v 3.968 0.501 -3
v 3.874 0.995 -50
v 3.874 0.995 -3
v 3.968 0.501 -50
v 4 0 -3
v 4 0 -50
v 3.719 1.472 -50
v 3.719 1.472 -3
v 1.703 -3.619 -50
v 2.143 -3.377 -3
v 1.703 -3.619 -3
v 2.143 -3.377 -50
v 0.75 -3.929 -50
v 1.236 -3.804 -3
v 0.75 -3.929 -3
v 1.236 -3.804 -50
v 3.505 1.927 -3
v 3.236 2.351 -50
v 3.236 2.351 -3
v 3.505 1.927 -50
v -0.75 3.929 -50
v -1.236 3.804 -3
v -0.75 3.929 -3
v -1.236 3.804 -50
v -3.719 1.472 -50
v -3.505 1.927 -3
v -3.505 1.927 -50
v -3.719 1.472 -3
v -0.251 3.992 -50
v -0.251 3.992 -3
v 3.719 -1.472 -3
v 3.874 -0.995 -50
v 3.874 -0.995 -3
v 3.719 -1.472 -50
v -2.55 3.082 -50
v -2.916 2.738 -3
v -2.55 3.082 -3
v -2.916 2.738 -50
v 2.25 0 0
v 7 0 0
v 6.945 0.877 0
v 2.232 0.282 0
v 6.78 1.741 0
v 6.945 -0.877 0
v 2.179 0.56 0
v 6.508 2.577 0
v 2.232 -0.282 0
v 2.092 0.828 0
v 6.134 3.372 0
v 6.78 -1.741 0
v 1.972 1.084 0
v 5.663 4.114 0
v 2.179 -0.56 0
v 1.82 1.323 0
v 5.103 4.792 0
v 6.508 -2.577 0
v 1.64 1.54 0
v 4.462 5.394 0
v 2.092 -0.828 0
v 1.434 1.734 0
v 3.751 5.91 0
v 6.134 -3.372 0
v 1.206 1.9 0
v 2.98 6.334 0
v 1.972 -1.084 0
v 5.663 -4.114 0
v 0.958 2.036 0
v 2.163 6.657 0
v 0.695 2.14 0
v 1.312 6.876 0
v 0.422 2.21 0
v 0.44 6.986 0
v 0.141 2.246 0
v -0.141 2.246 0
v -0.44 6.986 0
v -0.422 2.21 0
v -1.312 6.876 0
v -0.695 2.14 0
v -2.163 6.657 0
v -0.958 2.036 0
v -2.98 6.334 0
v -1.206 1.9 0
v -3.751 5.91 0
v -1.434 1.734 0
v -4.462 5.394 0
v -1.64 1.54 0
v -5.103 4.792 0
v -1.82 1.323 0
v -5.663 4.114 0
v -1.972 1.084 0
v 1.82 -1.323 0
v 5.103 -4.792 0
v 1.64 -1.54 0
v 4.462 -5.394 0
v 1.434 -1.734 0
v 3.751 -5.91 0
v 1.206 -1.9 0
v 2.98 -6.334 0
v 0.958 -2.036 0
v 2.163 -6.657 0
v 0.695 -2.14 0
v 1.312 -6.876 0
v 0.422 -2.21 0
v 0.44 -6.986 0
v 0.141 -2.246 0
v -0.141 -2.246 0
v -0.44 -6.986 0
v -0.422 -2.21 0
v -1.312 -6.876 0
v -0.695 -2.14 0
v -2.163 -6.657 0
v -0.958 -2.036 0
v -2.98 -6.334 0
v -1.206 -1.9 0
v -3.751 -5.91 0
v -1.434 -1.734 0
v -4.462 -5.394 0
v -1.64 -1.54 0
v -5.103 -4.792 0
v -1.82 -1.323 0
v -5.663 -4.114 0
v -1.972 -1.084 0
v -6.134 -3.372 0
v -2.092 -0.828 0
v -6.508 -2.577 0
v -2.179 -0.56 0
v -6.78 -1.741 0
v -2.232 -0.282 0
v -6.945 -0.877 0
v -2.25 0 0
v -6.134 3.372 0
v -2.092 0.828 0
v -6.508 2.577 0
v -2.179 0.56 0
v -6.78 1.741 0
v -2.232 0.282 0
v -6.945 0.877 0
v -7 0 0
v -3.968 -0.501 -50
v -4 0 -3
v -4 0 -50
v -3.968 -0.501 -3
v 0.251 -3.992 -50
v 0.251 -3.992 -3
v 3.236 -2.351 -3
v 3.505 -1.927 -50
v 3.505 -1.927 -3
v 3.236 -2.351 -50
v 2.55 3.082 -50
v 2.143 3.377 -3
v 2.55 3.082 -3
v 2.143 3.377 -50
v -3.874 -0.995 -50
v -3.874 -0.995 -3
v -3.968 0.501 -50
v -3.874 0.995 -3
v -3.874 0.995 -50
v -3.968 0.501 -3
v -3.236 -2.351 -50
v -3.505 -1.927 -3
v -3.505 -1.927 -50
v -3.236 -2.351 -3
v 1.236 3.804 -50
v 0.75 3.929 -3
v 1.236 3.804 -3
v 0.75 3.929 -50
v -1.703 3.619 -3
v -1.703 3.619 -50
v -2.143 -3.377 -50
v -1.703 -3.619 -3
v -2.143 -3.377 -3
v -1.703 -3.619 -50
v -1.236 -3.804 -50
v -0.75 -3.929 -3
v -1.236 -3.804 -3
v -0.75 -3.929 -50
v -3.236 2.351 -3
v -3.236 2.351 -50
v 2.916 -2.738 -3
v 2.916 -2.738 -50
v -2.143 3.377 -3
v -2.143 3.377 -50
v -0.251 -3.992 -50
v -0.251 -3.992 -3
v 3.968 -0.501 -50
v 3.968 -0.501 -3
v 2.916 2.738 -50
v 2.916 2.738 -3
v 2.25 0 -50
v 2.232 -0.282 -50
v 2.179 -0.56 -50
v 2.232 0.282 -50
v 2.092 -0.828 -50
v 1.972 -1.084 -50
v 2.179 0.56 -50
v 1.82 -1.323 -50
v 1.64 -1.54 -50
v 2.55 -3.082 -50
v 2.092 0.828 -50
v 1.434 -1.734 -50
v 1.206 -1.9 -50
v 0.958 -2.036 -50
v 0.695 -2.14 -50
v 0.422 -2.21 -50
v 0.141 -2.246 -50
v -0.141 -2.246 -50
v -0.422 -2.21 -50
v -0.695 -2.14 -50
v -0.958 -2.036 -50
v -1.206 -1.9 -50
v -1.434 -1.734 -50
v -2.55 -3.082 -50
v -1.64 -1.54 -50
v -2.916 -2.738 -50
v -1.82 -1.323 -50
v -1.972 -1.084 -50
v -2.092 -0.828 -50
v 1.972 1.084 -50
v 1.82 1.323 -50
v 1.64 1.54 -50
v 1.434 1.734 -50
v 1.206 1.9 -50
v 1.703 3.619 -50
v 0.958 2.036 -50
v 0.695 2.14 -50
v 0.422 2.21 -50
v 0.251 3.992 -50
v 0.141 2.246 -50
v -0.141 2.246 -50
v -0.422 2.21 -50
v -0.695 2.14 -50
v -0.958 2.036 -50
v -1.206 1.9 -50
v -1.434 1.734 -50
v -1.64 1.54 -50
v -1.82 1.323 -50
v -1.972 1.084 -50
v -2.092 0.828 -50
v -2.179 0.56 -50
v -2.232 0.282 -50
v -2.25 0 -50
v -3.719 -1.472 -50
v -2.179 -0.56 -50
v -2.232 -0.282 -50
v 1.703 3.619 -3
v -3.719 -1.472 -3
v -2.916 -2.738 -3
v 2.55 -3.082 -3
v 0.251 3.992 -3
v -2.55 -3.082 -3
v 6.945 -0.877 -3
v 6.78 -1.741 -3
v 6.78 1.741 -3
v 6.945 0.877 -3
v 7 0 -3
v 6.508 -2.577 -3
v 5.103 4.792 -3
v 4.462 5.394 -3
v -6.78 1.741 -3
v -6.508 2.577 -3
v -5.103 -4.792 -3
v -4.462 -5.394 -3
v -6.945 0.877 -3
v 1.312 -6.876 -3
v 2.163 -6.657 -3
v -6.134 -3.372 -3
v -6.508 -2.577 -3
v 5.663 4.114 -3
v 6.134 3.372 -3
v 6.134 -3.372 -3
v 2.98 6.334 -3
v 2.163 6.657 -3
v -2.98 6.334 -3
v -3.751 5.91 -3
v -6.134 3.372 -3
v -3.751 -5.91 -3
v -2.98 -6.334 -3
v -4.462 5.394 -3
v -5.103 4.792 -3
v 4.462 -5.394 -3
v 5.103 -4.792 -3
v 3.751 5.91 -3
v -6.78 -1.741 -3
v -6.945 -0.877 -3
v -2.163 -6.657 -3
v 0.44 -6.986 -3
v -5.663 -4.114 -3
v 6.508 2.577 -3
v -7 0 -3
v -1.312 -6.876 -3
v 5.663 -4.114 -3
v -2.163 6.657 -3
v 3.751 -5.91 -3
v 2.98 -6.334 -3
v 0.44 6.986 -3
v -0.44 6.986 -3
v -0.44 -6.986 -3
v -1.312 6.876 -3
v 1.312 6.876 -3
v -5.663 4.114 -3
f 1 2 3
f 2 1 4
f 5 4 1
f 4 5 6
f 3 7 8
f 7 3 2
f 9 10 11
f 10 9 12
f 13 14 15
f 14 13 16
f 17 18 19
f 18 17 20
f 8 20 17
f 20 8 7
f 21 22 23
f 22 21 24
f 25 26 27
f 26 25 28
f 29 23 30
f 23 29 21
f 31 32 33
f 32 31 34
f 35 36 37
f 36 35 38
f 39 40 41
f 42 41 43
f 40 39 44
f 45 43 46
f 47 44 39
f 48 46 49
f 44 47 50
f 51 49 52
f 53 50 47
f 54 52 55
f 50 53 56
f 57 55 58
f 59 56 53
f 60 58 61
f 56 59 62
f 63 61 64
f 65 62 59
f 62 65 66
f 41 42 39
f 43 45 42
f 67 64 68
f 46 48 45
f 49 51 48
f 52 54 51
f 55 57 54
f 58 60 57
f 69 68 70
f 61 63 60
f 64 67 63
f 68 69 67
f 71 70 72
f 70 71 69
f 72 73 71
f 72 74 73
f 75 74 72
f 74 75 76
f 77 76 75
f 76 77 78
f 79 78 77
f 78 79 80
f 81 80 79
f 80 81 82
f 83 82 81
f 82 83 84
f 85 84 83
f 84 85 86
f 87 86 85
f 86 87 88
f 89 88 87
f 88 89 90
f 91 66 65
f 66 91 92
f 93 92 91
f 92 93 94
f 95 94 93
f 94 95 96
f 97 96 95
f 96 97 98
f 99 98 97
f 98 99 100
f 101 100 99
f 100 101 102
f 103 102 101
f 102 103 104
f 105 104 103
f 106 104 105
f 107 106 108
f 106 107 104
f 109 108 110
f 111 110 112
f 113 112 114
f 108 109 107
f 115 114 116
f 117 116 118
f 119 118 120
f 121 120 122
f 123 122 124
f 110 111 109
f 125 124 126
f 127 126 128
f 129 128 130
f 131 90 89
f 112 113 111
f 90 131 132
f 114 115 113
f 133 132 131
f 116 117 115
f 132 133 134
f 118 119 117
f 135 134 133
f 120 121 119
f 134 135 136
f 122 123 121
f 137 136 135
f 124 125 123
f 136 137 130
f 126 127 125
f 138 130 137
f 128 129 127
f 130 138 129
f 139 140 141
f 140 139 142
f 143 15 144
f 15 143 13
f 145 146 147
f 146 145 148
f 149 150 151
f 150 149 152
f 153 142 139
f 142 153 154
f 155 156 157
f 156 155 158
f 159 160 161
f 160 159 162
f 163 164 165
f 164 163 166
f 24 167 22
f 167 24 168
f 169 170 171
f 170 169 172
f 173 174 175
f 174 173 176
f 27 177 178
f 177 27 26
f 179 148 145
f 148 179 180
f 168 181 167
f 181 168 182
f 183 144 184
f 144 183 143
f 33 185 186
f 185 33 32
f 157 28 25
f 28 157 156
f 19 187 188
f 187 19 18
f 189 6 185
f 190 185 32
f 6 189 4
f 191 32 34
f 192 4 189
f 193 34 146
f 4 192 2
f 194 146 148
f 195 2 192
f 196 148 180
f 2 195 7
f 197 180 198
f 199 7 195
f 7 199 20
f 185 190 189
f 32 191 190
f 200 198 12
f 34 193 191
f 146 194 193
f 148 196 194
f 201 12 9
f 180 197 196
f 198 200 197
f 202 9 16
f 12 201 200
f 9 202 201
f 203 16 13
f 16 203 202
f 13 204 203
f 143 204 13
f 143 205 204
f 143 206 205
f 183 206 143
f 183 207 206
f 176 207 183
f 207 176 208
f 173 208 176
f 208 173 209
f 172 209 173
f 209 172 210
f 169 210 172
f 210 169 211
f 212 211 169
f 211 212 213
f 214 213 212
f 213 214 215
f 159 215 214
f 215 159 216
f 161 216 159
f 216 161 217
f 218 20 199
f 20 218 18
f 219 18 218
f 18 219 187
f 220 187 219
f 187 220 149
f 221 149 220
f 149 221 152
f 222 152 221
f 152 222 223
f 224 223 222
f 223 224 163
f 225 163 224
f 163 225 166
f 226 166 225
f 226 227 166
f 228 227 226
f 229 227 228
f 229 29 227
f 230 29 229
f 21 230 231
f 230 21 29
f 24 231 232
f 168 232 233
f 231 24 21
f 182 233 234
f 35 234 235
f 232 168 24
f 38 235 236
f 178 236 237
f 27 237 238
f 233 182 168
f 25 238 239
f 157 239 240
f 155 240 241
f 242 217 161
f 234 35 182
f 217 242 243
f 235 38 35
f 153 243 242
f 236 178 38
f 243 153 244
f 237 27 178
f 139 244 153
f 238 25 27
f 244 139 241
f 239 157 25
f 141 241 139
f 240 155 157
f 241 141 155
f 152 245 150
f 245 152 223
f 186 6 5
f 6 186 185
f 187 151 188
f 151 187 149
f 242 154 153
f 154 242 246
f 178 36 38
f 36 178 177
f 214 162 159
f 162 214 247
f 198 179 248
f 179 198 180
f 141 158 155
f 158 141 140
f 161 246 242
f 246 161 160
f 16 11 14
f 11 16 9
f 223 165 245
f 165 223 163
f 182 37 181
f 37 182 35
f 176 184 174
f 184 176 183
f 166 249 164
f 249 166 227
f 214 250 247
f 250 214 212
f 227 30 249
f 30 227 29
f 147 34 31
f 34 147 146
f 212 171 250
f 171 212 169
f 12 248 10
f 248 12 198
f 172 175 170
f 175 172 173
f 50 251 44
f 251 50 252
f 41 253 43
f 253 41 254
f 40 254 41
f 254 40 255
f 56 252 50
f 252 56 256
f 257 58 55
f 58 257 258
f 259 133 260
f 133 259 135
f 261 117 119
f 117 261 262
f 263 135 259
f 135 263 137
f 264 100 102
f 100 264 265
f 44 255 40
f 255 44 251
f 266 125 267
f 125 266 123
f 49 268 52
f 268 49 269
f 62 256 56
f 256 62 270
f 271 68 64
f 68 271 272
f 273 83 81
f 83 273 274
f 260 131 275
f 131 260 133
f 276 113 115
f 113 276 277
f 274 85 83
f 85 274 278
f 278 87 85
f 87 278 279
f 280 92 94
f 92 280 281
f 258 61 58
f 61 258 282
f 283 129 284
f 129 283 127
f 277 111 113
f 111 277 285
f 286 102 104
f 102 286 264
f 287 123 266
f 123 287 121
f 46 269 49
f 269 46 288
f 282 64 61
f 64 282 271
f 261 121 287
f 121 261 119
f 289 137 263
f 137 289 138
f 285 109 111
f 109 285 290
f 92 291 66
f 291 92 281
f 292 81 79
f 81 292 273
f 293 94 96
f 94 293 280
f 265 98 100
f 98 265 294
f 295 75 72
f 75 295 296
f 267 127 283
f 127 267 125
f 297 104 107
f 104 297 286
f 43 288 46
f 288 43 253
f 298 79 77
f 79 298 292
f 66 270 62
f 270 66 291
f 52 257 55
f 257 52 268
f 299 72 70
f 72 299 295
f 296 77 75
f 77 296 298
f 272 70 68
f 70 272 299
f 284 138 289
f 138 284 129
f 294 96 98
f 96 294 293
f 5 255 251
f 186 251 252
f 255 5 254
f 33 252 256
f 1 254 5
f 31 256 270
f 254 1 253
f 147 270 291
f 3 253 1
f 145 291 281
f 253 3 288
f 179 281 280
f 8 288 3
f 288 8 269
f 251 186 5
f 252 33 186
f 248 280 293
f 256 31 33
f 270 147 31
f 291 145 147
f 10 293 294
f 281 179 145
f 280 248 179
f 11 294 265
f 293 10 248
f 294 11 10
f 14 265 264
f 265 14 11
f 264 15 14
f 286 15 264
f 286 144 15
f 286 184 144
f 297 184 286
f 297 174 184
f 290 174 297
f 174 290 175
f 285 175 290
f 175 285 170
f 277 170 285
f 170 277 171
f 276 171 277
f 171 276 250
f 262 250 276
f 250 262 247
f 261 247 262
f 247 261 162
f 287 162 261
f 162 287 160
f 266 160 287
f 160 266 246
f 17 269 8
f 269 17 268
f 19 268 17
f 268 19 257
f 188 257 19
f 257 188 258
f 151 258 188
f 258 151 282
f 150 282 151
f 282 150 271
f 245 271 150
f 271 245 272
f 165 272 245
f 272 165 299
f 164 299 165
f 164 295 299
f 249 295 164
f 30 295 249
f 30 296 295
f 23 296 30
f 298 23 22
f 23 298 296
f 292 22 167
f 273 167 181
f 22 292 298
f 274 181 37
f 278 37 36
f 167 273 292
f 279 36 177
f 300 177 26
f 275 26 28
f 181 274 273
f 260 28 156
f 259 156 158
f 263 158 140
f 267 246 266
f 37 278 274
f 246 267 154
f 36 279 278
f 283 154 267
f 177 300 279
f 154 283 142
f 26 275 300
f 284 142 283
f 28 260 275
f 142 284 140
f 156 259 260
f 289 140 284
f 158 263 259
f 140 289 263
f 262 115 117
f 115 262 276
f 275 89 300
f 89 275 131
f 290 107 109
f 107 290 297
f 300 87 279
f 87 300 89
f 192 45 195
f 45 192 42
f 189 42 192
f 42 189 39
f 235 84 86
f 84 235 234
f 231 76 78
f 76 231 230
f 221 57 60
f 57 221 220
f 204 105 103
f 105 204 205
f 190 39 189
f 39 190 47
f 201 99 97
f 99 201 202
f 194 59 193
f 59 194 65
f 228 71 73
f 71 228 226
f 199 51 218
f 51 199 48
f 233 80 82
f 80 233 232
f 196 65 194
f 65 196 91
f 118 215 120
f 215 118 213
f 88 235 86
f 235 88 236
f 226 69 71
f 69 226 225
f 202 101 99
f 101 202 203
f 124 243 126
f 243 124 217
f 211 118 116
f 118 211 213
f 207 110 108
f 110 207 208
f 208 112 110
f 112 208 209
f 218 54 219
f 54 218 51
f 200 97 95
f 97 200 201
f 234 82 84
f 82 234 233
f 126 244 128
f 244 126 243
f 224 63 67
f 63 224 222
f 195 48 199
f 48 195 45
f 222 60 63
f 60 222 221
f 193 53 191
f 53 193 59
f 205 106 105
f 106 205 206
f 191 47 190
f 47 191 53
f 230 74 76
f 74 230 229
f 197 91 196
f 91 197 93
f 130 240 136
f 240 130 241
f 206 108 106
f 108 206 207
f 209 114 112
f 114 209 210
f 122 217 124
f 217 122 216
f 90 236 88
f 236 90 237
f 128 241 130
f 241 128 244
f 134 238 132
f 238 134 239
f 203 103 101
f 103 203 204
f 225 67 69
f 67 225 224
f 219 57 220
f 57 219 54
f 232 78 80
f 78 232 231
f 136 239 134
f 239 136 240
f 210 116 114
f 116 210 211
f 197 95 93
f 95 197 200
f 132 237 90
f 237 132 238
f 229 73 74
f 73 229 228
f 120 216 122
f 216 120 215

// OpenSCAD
$fn = 50;


difference() {
	union() {
		translate(v = [0, 0, -50.0000000000]) {
			cylinder(h = 50, r = 4.0000000000);
		}
		translate(v = [0, 0, -3.0000000000]) {
			cylinder(h = 3, r = 7.0000000000);
		}
	}
	union() {
		#translate(v = [0, 0, -50]) {
			cylinder(h = 50, r = 2.2500000000);
		}
	}
}
